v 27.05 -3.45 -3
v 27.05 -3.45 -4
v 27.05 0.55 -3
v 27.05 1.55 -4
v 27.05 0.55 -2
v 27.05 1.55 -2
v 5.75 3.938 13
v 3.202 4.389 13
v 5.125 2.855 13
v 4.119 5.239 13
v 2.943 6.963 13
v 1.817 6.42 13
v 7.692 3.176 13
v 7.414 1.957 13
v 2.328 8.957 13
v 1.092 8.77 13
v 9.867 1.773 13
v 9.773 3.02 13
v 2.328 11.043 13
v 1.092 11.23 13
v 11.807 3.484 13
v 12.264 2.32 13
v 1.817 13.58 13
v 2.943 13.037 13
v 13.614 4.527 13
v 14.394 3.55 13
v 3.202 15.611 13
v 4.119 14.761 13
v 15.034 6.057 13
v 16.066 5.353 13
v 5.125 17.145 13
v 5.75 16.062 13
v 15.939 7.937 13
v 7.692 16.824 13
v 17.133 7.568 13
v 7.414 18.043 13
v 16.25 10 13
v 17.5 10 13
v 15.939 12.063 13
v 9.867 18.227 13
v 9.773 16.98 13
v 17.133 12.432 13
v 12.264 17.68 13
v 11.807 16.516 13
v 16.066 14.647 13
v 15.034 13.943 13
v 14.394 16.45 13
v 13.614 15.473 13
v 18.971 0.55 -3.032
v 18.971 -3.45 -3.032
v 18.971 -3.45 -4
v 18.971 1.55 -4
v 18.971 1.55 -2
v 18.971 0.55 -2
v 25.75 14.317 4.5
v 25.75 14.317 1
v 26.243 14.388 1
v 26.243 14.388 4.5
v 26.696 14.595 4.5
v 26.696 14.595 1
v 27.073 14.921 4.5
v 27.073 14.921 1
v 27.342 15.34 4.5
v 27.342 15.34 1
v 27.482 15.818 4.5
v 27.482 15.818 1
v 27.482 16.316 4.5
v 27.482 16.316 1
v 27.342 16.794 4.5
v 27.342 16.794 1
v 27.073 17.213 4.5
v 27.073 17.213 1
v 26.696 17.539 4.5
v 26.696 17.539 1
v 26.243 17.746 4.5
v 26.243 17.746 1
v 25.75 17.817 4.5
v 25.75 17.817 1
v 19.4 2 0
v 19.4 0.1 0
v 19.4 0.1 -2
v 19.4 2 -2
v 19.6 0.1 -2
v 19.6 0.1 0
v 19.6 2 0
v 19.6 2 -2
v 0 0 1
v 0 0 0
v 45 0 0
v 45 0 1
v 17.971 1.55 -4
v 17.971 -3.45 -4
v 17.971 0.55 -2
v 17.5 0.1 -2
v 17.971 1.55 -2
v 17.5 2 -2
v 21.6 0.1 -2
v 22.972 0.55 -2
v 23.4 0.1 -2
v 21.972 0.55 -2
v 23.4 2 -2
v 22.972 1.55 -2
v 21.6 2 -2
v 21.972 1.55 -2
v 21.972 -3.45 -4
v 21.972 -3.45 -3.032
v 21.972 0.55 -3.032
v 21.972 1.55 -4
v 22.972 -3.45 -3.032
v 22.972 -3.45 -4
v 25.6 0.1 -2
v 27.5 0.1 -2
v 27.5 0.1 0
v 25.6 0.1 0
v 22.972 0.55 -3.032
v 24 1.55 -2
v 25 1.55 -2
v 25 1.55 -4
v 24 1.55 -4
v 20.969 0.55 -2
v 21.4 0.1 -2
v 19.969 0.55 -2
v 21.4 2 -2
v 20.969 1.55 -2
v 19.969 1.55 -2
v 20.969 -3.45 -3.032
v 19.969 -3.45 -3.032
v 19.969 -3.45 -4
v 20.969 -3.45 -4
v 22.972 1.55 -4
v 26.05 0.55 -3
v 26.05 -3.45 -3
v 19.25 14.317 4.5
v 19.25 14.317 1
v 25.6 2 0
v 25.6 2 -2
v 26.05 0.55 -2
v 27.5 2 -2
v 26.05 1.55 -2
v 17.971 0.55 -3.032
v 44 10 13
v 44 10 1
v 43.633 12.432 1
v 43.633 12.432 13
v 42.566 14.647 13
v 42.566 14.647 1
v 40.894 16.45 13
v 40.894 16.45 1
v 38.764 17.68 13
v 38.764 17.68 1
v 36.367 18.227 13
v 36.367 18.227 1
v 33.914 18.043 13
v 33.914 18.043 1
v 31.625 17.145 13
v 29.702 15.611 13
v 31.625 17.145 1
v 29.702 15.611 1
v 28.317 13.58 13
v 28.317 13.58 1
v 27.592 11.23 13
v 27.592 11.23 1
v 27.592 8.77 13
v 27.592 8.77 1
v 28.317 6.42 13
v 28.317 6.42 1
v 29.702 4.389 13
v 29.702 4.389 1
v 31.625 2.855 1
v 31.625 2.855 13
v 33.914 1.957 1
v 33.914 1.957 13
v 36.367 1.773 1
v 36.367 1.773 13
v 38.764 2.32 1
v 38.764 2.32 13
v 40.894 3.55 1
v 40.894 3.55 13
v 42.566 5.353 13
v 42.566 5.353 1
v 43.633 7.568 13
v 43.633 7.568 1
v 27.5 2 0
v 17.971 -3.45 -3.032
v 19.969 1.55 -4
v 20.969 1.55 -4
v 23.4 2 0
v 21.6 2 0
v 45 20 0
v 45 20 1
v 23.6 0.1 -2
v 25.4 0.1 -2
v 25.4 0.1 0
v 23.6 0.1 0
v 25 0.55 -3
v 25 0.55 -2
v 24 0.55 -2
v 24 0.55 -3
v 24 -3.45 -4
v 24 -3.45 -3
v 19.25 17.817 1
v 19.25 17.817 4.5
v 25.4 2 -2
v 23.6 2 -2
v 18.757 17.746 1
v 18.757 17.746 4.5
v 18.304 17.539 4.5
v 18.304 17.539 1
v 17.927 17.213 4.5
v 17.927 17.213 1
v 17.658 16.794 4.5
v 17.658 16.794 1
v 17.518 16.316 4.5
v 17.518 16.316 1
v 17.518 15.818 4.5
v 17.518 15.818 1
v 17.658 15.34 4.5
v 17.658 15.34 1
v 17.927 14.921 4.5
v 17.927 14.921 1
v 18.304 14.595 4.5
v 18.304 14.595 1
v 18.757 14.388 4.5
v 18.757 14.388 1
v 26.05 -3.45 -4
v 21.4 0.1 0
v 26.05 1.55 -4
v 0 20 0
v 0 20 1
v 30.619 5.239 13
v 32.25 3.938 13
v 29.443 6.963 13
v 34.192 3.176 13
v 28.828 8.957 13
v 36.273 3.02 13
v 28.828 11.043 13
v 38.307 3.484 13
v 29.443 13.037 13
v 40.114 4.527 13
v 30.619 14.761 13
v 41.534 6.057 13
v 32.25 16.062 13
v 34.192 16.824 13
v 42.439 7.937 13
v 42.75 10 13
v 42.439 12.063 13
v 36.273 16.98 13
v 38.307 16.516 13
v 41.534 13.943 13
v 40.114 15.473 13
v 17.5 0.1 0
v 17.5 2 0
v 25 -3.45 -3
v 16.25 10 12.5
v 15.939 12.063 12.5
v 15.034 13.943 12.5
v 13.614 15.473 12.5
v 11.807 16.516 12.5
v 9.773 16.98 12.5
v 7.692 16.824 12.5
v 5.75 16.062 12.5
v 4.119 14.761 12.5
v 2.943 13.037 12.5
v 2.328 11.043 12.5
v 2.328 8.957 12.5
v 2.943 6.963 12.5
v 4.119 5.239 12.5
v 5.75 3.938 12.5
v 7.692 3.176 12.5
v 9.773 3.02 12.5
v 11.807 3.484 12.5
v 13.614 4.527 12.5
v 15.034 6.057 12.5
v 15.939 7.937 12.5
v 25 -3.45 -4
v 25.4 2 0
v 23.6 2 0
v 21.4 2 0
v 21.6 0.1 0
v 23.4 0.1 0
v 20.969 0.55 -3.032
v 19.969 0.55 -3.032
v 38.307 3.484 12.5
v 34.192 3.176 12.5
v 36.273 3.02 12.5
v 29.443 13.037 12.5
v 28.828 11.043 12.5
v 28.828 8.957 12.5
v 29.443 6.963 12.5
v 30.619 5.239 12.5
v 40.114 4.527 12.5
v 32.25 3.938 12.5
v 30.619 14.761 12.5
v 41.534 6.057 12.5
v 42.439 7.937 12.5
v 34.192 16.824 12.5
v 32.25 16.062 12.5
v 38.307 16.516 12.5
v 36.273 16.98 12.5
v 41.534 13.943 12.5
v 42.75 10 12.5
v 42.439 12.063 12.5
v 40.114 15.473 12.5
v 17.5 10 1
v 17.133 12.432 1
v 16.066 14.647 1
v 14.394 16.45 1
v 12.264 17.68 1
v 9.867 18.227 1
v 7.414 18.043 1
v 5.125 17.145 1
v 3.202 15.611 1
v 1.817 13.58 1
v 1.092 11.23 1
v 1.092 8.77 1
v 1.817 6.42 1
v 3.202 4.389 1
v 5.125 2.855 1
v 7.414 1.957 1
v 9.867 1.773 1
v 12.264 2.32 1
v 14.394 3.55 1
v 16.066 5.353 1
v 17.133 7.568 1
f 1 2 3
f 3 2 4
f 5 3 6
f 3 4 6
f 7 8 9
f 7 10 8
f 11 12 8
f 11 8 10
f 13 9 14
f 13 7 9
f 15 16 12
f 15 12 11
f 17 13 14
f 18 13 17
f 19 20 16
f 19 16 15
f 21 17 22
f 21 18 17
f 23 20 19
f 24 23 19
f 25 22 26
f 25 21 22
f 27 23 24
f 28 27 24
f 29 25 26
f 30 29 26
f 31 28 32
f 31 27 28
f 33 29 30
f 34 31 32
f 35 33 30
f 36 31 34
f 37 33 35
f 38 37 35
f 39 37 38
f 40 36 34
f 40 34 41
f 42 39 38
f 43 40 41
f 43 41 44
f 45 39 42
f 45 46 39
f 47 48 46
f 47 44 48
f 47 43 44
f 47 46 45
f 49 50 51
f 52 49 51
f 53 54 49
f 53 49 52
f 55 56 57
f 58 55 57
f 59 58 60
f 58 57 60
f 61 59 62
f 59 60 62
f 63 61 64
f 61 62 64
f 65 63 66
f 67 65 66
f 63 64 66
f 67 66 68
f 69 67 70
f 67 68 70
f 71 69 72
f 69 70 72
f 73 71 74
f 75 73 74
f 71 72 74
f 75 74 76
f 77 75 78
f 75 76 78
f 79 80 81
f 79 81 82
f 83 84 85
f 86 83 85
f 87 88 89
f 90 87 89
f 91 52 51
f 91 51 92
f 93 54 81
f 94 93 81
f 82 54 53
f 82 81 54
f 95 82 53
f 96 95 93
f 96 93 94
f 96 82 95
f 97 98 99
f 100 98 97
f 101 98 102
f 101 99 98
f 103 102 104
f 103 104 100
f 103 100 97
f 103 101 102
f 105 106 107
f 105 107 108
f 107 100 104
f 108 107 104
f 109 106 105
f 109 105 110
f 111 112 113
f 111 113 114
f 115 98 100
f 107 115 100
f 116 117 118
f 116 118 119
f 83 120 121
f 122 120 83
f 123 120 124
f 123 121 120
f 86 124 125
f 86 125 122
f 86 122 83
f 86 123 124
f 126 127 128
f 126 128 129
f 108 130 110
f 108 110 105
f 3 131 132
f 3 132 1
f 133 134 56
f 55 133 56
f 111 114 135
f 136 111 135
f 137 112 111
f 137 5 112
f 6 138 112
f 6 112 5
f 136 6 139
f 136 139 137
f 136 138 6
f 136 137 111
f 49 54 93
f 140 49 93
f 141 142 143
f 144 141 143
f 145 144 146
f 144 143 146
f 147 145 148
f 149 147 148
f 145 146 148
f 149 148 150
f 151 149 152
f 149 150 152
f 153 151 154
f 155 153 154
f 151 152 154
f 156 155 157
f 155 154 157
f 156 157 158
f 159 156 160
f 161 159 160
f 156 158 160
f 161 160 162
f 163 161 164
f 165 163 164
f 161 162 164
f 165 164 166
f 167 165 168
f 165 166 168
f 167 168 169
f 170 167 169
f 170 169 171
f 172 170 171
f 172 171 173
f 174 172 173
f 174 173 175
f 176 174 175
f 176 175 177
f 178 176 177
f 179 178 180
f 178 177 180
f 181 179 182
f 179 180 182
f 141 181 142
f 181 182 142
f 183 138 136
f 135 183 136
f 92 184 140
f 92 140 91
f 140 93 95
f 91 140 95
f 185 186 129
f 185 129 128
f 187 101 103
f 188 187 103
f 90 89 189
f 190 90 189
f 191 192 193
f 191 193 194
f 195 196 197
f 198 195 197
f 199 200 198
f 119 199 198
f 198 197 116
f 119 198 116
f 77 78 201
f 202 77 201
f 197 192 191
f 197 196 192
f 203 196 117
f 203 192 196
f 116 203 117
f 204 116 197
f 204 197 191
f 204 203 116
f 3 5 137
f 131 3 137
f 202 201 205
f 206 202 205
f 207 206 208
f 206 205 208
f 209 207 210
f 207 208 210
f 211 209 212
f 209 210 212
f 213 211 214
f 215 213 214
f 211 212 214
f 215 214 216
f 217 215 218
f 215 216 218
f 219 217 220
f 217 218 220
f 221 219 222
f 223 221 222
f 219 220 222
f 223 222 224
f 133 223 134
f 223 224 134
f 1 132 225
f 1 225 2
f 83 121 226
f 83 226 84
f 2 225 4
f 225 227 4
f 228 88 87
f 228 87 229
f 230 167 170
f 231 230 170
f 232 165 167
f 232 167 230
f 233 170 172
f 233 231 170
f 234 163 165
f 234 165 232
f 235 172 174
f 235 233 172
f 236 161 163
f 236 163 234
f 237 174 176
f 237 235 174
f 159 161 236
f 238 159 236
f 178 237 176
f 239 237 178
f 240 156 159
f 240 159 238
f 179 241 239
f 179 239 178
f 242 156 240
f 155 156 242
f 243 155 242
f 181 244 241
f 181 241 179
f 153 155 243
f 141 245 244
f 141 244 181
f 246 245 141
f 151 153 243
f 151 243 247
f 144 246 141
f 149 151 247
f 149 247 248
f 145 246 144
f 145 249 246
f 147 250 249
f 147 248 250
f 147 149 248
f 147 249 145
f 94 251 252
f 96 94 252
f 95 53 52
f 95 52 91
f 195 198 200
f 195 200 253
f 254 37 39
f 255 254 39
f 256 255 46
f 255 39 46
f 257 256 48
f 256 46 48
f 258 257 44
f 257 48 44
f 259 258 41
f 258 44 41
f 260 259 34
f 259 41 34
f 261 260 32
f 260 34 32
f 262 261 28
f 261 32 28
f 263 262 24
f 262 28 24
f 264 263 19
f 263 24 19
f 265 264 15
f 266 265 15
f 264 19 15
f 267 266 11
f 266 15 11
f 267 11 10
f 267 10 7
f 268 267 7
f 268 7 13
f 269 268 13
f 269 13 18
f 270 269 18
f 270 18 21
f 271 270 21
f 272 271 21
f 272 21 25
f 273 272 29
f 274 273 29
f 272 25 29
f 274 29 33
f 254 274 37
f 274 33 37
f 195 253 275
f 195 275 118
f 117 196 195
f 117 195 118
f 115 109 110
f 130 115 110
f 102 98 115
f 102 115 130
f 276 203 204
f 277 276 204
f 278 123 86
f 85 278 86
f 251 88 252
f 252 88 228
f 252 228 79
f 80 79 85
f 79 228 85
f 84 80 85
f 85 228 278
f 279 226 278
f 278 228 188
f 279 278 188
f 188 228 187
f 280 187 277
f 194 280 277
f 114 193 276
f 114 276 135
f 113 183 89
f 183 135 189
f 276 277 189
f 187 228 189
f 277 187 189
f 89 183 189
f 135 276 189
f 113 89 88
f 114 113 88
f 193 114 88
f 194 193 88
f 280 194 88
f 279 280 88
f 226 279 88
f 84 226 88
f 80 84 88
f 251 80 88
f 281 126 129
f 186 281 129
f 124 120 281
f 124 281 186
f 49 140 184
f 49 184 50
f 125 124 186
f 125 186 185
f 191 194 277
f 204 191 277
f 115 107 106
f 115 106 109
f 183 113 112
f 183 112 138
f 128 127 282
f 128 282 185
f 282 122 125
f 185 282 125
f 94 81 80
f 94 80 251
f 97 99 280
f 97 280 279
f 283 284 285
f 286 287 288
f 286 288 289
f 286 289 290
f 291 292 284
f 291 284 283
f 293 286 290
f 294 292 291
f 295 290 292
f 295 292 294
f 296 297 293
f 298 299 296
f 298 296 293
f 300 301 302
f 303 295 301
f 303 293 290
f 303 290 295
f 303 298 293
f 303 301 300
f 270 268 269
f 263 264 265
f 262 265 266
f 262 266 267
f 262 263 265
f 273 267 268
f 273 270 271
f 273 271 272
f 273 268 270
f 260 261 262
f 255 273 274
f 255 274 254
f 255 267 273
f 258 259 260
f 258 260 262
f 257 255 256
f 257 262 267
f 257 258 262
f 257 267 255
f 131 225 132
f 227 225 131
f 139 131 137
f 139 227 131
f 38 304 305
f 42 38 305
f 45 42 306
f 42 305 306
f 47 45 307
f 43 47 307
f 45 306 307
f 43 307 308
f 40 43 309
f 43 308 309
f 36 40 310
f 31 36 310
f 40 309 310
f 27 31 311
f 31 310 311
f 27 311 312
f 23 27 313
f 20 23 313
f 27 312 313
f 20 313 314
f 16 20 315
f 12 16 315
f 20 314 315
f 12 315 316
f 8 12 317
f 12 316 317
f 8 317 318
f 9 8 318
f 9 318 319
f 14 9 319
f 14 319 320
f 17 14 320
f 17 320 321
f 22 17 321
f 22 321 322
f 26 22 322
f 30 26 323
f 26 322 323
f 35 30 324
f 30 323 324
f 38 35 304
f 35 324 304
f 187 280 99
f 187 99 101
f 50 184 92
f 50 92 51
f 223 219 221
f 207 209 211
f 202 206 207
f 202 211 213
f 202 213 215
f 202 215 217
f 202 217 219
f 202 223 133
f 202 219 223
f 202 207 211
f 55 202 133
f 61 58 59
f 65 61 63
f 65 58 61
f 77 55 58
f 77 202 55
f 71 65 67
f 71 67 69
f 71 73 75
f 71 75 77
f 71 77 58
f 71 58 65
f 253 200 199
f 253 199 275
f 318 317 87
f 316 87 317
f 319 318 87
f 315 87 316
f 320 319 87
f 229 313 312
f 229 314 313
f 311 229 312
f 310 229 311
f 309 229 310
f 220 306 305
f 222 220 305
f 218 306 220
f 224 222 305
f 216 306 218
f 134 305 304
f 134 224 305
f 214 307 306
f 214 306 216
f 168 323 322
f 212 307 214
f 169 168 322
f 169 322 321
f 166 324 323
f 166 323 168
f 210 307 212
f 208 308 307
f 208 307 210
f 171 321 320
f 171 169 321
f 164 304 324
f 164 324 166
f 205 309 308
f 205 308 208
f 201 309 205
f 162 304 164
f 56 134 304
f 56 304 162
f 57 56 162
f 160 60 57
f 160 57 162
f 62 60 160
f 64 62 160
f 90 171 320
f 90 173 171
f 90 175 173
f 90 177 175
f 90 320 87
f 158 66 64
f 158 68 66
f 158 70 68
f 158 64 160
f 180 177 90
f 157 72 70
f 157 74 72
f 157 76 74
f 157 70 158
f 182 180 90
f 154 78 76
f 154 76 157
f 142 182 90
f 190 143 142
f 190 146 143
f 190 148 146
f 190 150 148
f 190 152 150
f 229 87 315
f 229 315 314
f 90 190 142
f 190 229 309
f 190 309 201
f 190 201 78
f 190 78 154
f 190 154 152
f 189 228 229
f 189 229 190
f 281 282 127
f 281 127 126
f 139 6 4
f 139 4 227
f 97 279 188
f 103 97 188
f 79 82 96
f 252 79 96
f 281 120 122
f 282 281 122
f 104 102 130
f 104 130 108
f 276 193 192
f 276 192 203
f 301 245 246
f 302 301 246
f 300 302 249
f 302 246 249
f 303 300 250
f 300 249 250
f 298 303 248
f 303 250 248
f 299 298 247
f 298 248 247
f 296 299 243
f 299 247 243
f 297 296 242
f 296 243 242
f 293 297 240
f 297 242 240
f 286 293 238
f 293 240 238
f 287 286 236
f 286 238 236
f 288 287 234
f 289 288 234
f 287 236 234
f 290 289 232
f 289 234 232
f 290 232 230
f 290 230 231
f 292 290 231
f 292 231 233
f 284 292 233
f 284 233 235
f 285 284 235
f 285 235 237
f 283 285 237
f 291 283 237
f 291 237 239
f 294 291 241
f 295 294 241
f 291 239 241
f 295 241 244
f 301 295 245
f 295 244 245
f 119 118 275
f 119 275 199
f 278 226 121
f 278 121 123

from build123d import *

# Parameters (mm, degrees)
ESBO_O1_W                = 45
ESBO_O1_H                = 20
RESSALTO_EXTRUS_O1_DEPTH = 1
ESBO_O2_R                = 8.25
RESSALTO_EXTRUS_O2_DEPTH = 12
ESBO_O3_R                = 7
CORTE_EXTRUS_O1_DEPTH    = 0.5
RESSALTO_EXTRUS_O5_DEPTH = 3.5
ESBO_O7_W                = 1.9
ESBO_O7_H                = 2
ESBO_O7_W_2              = 1.8
RESSALTO_EXTRUS_O6_DEPTH = 2
ESBO_O9_W                = 10
ESBO_O9_H                = 0.1
CORTE_EXTRUS_O2_DEPTH    = 2
ESBO_O10_W               = 1
ESBO_O10_H               = 1
RESSALTO_EXTRUS_O7_DEPTH = 2
ESBO_O11_W               = 1
ESBO_O11_H               = 1
ESBO_O11_H_2             = 0.967747288
RESSALTO_EXTRUS_O8_DEPTH = 4


with BuildPart() as part:
    # Esboço1 → Ressalto-extrusão1 (new body)
    with BuildSketch(Plane.XY):
        with Locations((22.5, 10)):
            Rectangle(ESBO_O1_W, ESBO_O1_H)
    extrude(amount=RESSALTO_EXTRUS_O1_DEPTH)

    # Esboço2 → Ressalto-extrusão2 (add)
    with BuildSketch(Plane.XY.offset(1)):
        with Locations((9.25, 10)):
            Circle(ESBO_O2_R)
        with Locations((35.75, 10)):
            Circle(ESBO_O2_R)
    extrude(amount=RESSALTO_EXTRUS_O2_DEPTH)

    # Esboço3 → Corte-extrusão1 (cut)
    with BuildSketch(Plane.XY.offset(13)):
        with Locations((9.25, 10)):
            Circle(ESBO_O3_R)
        with Locations((35.75, 10)):
            Circle(ESBO_O3_R)
    extrude(amount=-CORTE_EXTRUS_O1_DEPTH, mode=Mode.SUBTRACT)

    # Esboço6 → Ressalto-extrusão5 (add)
    with BuildSketch(Plane.XY.offset(1)):
        with BuildLine():
            Line((25.75, 17.816758405), (19.25, 17.816758405))
            ThreePointArc((19.25, 17.816758405), (17.5, 16.066758405), (19.25, 14.316758405))
            Line((19.25, 14.316758405), (25.75, 14.316758405))
            ThreePointArc((25.75, 14.316758405), (27.5, 16.066758405), (25.75, 17.816758405))
        make_face()
    extrude(amount=RESSALTO_EXTRUS_O5_DEPTH)

    # Esboço7 → Ressalto-extrusão6 (add)
    with BuildSketch(Plane(origin=(0, 0, 0), x_dir=(-1, 0, 0), z_dir=(0, 0, -1))):
        with Locations((-26.55, 1)):
            Rectangle(ESBO_O7_W, ESBO_O7_H)
        with Locations((-24.5, 1)):
            Rectangle(ESBO_O7_W_2, ESBO_O7_H)
        with Locations((-22.5, 1)):
            Rectangle(ESBO_O7_W_2, ESBO_O7_H)
        with Locations((-20.5, 1)):
            Rectangle(ESBO_O7_W_2, ESBO_O7_H)
        with Locations((-18.45, 1)):
            Rectangle(ESBO_O7_W, ESBO_O7_H)
    extrude(amount=RESSALTO_EXTRUS_O6_DEPTH)

    # Esboço9 → Corte-extrusão2 (cut)
    with BuildSketch(Plane(origin=(0, 0, -2), x_dir=(-1, 0, 0), z_dir=(0, 0, -1))):
        with Locations((-22.5, 0.05)):
            Rectangle(ESBO_O9_W, ESBO_O9_H)
    extrude(amount=-CORTE_EXTRUS_O2_DEPTH, mode=Mode.SUBTRACT)

    # Esboço10 → Ressalto-extrusão7 (add)
    with BuildSketch(Plane(origin=(0, 0, -2), x_dir=(-1, 0, 0), z_dir=(0, 0, -1))):
        with Locations((-24.5, 1.05)):
            Rectangle(ESBO_O10_W, ESBO_O10_H)
        with Locations((-26.55, 1.05)):
            Rectangle(ESBO_O10_W, ESBO_O10_H)
        with Locations((-22.472435469, 1.05)):
            Rectangle(ESBO_O10_W, ESBO_O10_H)
        with Locations((-20.46939422, 1.05)):
            Rectangle(ESBO_O10_W, ESBO_O10_H)
        with Locations((-18.471440092, 1.05)):
            Rectangle(ESBO_O10_W, ESBO_O10_H)
    extrude(amount=RESSALTO_EXTRUS_O7_DEPTH)

    # Esboço11 → Ressalto-extrusão8 (add)
    with BuildSketch(Plane.XZ.offset(-0.55)):
        with Locations((26.55, -3.5)):
            Rectangle(ESBO_O11_W, ESBO_O11_H)
        with Locations((24.5, -3.5)):
            Rectangle(ESBO_O11_W, ESBO_O11_H)
        with Locations((22.472435469, -3.516126356)):
            Rectangle(ESBO_O11_W, ESBO_O11_H_2)
        with Locations((20.46939422, -3.516126356)):
            Rectangle(ESBO_O11_W, ESBO_O11_H_2)
        with Locations((18.471440092, -3.516126356)):
            Rectangle(ESBO_O11_W, ESBO_O11_H_2)
    extrude(amount=RESSALTO_EXTRUS_O8_DEPTH)


solid = part.part
